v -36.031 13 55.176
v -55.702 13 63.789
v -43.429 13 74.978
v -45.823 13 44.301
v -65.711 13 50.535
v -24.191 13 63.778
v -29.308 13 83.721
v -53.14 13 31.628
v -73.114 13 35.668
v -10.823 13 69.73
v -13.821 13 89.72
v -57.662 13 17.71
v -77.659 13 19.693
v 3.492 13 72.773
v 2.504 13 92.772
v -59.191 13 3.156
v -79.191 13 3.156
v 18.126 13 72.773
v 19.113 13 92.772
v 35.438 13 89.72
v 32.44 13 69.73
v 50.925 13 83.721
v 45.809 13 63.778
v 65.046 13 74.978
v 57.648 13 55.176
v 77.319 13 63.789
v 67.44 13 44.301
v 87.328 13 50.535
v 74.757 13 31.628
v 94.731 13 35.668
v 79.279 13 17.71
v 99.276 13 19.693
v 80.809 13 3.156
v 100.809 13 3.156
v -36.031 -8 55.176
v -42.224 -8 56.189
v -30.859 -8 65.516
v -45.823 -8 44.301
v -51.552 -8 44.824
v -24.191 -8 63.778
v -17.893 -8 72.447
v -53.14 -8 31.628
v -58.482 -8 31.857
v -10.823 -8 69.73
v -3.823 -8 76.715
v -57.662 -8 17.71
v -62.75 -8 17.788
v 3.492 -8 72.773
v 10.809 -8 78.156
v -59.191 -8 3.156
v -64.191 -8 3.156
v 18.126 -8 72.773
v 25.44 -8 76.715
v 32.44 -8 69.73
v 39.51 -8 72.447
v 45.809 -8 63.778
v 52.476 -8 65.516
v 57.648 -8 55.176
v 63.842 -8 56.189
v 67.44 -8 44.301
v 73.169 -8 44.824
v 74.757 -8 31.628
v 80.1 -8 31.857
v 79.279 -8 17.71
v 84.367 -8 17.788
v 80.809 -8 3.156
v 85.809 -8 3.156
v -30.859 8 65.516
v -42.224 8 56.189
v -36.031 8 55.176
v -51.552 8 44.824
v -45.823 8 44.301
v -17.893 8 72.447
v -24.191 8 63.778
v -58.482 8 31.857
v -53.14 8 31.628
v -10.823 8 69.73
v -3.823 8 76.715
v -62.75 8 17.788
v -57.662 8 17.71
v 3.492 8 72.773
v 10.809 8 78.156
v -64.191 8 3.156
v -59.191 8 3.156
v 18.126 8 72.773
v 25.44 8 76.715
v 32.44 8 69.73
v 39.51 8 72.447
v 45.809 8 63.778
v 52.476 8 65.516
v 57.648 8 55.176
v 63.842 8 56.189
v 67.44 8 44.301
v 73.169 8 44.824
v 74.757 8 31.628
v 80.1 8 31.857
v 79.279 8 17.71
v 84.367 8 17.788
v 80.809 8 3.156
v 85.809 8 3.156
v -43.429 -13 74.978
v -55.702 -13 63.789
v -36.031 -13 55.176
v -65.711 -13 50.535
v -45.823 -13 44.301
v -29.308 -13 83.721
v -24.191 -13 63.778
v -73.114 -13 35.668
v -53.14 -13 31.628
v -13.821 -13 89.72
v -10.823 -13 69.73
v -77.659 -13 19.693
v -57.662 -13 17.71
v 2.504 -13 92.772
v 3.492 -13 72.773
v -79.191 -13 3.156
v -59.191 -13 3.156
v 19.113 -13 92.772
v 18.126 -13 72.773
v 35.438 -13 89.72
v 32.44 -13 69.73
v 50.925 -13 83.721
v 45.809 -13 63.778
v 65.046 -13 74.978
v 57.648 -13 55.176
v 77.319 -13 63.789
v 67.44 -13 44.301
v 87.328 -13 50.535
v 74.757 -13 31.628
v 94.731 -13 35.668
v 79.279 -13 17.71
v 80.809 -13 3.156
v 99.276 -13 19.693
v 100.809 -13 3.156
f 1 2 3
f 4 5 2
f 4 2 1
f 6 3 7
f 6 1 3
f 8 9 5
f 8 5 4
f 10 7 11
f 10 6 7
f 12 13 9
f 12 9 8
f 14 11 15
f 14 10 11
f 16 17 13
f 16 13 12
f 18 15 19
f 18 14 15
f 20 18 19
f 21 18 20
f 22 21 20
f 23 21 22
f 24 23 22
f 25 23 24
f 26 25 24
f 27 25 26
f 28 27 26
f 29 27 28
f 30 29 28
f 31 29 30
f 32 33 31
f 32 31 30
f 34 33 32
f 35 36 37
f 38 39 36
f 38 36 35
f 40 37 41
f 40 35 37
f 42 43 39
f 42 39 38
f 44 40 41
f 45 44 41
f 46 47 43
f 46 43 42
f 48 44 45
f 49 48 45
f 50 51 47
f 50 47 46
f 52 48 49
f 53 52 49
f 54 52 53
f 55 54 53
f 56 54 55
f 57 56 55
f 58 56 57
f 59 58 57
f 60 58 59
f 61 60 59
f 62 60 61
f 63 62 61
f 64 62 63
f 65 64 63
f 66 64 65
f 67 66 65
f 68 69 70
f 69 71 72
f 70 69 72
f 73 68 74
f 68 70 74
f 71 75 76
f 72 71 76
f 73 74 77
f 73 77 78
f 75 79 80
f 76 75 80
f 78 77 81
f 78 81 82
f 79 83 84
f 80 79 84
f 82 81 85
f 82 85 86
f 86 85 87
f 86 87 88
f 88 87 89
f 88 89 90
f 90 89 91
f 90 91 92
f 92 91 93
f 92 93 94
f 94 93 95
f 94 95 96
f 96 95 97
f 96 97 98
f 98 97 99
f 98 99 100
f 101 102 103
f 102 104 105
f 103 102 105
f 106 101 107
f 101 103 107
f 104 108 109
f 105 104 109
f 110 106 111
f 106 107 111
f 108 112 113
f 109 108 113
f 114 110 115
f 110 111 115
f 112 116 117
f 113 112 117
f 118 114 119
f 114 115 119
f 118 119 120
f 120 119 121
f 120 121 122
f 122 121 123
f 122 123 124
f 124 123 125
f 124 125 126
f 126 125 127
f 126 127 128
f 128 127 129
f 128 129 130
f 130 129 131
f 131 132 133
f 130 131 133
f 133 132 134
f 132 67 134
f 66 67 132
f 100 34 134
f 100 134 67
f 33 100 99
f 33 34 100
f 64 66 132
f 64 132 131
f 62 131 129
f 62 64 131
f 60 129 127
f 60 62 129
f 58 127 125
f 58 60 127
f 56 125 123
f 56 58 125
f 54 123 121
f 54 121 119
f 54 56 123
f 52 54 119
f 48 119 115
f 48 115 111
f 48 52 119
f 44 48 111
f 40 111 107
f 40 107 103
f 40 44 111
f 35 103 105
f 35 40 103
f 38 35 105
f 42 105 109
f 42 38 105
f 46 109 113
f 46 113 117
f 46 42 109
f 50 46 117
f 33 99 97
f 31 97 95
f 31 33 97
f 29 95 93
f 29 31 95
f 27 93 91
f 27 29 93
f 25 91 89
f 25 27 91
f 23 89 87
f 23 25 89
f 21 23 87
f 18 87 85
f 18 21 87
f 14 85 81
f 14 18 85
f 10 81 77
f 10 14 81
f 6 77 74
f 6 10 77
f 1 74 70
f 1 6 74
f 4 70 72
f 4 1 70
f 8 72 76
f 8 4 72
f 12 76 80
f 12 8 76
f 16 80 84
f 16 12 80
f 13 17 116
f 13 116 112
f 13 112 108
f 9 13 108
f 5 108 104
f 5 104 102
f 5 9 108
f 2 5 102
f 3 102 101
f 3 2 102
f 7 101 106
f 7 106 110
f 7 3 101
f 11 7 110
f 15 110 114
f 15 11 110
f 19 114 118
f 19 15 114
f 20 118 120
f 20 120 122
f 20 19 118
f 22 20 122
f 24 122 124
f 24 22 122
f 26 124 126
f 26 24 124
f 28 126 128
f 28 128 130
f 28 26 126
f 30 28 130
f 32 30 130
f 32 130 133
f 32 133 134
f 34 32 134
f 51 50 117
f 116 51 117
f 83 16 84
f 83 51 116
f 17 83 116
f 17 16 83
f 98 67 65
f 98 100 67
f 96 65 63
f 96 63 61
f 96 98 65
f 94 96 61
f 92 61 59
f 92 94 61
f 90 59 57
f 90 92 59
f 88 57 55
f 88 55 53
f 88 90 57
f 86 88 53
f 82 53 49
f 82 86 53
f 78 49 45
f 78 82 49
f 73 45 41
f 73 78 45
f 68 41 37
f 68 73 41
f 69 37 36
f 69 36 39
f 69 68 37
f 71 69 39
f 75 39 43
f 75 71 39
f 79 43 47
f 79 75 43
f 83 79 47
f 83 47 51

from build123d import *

# Parameters (mm, degrees)
BOSS_EXTRUDE1_DEPTH = 13
SKETCH2_W           = 5
SKETCH2_H           = 16


with BuildPart() as part:
    # Sketch1 → Boss-Extrude1 (new, symmetric)
    with BuildSketch(Plane(origin=(0, 0, 0), x_dir=(1, 0, 0), z_dir=(0, 1, 0))):
        with BuildLine():
            Line((-59.191435728, -3.155996626), (-79.191435728, -3.155996626))
            ThreePointArc((-79.191435728, -3.155996626), (10.808564272, -93.155996626), (100.808564272, -3.155996626))
            Line((100.808564272, -3.155996626), (80.808564272, -3.155996626))
            ThreePointArc((80.808564272, -3.155996626), (10.808564272, -73.155996626), (-59.191435728, -3.155996626))
        make_face()
    extrude(amount=BOSS_EXTRUDE1_DEPTH, both=True)

    # Sketch2 → Cut-Revolve1 (revolve, cut)
    with BuildSketch(Plane(origin=(0, 0, 3.155996626), x_dir=(-1, 0, 0), z_dir=(0, 0, -1))):
        with Locations((61.691435728, 0)):
            Rectangle(SKETCH2_W, SKETCH2_H)
    revolve(axis=Axis((10.808564272, 13, 3.155996626), (0, -1, 0)), mode=Mode.SUBTRACT)


solid = part.part
